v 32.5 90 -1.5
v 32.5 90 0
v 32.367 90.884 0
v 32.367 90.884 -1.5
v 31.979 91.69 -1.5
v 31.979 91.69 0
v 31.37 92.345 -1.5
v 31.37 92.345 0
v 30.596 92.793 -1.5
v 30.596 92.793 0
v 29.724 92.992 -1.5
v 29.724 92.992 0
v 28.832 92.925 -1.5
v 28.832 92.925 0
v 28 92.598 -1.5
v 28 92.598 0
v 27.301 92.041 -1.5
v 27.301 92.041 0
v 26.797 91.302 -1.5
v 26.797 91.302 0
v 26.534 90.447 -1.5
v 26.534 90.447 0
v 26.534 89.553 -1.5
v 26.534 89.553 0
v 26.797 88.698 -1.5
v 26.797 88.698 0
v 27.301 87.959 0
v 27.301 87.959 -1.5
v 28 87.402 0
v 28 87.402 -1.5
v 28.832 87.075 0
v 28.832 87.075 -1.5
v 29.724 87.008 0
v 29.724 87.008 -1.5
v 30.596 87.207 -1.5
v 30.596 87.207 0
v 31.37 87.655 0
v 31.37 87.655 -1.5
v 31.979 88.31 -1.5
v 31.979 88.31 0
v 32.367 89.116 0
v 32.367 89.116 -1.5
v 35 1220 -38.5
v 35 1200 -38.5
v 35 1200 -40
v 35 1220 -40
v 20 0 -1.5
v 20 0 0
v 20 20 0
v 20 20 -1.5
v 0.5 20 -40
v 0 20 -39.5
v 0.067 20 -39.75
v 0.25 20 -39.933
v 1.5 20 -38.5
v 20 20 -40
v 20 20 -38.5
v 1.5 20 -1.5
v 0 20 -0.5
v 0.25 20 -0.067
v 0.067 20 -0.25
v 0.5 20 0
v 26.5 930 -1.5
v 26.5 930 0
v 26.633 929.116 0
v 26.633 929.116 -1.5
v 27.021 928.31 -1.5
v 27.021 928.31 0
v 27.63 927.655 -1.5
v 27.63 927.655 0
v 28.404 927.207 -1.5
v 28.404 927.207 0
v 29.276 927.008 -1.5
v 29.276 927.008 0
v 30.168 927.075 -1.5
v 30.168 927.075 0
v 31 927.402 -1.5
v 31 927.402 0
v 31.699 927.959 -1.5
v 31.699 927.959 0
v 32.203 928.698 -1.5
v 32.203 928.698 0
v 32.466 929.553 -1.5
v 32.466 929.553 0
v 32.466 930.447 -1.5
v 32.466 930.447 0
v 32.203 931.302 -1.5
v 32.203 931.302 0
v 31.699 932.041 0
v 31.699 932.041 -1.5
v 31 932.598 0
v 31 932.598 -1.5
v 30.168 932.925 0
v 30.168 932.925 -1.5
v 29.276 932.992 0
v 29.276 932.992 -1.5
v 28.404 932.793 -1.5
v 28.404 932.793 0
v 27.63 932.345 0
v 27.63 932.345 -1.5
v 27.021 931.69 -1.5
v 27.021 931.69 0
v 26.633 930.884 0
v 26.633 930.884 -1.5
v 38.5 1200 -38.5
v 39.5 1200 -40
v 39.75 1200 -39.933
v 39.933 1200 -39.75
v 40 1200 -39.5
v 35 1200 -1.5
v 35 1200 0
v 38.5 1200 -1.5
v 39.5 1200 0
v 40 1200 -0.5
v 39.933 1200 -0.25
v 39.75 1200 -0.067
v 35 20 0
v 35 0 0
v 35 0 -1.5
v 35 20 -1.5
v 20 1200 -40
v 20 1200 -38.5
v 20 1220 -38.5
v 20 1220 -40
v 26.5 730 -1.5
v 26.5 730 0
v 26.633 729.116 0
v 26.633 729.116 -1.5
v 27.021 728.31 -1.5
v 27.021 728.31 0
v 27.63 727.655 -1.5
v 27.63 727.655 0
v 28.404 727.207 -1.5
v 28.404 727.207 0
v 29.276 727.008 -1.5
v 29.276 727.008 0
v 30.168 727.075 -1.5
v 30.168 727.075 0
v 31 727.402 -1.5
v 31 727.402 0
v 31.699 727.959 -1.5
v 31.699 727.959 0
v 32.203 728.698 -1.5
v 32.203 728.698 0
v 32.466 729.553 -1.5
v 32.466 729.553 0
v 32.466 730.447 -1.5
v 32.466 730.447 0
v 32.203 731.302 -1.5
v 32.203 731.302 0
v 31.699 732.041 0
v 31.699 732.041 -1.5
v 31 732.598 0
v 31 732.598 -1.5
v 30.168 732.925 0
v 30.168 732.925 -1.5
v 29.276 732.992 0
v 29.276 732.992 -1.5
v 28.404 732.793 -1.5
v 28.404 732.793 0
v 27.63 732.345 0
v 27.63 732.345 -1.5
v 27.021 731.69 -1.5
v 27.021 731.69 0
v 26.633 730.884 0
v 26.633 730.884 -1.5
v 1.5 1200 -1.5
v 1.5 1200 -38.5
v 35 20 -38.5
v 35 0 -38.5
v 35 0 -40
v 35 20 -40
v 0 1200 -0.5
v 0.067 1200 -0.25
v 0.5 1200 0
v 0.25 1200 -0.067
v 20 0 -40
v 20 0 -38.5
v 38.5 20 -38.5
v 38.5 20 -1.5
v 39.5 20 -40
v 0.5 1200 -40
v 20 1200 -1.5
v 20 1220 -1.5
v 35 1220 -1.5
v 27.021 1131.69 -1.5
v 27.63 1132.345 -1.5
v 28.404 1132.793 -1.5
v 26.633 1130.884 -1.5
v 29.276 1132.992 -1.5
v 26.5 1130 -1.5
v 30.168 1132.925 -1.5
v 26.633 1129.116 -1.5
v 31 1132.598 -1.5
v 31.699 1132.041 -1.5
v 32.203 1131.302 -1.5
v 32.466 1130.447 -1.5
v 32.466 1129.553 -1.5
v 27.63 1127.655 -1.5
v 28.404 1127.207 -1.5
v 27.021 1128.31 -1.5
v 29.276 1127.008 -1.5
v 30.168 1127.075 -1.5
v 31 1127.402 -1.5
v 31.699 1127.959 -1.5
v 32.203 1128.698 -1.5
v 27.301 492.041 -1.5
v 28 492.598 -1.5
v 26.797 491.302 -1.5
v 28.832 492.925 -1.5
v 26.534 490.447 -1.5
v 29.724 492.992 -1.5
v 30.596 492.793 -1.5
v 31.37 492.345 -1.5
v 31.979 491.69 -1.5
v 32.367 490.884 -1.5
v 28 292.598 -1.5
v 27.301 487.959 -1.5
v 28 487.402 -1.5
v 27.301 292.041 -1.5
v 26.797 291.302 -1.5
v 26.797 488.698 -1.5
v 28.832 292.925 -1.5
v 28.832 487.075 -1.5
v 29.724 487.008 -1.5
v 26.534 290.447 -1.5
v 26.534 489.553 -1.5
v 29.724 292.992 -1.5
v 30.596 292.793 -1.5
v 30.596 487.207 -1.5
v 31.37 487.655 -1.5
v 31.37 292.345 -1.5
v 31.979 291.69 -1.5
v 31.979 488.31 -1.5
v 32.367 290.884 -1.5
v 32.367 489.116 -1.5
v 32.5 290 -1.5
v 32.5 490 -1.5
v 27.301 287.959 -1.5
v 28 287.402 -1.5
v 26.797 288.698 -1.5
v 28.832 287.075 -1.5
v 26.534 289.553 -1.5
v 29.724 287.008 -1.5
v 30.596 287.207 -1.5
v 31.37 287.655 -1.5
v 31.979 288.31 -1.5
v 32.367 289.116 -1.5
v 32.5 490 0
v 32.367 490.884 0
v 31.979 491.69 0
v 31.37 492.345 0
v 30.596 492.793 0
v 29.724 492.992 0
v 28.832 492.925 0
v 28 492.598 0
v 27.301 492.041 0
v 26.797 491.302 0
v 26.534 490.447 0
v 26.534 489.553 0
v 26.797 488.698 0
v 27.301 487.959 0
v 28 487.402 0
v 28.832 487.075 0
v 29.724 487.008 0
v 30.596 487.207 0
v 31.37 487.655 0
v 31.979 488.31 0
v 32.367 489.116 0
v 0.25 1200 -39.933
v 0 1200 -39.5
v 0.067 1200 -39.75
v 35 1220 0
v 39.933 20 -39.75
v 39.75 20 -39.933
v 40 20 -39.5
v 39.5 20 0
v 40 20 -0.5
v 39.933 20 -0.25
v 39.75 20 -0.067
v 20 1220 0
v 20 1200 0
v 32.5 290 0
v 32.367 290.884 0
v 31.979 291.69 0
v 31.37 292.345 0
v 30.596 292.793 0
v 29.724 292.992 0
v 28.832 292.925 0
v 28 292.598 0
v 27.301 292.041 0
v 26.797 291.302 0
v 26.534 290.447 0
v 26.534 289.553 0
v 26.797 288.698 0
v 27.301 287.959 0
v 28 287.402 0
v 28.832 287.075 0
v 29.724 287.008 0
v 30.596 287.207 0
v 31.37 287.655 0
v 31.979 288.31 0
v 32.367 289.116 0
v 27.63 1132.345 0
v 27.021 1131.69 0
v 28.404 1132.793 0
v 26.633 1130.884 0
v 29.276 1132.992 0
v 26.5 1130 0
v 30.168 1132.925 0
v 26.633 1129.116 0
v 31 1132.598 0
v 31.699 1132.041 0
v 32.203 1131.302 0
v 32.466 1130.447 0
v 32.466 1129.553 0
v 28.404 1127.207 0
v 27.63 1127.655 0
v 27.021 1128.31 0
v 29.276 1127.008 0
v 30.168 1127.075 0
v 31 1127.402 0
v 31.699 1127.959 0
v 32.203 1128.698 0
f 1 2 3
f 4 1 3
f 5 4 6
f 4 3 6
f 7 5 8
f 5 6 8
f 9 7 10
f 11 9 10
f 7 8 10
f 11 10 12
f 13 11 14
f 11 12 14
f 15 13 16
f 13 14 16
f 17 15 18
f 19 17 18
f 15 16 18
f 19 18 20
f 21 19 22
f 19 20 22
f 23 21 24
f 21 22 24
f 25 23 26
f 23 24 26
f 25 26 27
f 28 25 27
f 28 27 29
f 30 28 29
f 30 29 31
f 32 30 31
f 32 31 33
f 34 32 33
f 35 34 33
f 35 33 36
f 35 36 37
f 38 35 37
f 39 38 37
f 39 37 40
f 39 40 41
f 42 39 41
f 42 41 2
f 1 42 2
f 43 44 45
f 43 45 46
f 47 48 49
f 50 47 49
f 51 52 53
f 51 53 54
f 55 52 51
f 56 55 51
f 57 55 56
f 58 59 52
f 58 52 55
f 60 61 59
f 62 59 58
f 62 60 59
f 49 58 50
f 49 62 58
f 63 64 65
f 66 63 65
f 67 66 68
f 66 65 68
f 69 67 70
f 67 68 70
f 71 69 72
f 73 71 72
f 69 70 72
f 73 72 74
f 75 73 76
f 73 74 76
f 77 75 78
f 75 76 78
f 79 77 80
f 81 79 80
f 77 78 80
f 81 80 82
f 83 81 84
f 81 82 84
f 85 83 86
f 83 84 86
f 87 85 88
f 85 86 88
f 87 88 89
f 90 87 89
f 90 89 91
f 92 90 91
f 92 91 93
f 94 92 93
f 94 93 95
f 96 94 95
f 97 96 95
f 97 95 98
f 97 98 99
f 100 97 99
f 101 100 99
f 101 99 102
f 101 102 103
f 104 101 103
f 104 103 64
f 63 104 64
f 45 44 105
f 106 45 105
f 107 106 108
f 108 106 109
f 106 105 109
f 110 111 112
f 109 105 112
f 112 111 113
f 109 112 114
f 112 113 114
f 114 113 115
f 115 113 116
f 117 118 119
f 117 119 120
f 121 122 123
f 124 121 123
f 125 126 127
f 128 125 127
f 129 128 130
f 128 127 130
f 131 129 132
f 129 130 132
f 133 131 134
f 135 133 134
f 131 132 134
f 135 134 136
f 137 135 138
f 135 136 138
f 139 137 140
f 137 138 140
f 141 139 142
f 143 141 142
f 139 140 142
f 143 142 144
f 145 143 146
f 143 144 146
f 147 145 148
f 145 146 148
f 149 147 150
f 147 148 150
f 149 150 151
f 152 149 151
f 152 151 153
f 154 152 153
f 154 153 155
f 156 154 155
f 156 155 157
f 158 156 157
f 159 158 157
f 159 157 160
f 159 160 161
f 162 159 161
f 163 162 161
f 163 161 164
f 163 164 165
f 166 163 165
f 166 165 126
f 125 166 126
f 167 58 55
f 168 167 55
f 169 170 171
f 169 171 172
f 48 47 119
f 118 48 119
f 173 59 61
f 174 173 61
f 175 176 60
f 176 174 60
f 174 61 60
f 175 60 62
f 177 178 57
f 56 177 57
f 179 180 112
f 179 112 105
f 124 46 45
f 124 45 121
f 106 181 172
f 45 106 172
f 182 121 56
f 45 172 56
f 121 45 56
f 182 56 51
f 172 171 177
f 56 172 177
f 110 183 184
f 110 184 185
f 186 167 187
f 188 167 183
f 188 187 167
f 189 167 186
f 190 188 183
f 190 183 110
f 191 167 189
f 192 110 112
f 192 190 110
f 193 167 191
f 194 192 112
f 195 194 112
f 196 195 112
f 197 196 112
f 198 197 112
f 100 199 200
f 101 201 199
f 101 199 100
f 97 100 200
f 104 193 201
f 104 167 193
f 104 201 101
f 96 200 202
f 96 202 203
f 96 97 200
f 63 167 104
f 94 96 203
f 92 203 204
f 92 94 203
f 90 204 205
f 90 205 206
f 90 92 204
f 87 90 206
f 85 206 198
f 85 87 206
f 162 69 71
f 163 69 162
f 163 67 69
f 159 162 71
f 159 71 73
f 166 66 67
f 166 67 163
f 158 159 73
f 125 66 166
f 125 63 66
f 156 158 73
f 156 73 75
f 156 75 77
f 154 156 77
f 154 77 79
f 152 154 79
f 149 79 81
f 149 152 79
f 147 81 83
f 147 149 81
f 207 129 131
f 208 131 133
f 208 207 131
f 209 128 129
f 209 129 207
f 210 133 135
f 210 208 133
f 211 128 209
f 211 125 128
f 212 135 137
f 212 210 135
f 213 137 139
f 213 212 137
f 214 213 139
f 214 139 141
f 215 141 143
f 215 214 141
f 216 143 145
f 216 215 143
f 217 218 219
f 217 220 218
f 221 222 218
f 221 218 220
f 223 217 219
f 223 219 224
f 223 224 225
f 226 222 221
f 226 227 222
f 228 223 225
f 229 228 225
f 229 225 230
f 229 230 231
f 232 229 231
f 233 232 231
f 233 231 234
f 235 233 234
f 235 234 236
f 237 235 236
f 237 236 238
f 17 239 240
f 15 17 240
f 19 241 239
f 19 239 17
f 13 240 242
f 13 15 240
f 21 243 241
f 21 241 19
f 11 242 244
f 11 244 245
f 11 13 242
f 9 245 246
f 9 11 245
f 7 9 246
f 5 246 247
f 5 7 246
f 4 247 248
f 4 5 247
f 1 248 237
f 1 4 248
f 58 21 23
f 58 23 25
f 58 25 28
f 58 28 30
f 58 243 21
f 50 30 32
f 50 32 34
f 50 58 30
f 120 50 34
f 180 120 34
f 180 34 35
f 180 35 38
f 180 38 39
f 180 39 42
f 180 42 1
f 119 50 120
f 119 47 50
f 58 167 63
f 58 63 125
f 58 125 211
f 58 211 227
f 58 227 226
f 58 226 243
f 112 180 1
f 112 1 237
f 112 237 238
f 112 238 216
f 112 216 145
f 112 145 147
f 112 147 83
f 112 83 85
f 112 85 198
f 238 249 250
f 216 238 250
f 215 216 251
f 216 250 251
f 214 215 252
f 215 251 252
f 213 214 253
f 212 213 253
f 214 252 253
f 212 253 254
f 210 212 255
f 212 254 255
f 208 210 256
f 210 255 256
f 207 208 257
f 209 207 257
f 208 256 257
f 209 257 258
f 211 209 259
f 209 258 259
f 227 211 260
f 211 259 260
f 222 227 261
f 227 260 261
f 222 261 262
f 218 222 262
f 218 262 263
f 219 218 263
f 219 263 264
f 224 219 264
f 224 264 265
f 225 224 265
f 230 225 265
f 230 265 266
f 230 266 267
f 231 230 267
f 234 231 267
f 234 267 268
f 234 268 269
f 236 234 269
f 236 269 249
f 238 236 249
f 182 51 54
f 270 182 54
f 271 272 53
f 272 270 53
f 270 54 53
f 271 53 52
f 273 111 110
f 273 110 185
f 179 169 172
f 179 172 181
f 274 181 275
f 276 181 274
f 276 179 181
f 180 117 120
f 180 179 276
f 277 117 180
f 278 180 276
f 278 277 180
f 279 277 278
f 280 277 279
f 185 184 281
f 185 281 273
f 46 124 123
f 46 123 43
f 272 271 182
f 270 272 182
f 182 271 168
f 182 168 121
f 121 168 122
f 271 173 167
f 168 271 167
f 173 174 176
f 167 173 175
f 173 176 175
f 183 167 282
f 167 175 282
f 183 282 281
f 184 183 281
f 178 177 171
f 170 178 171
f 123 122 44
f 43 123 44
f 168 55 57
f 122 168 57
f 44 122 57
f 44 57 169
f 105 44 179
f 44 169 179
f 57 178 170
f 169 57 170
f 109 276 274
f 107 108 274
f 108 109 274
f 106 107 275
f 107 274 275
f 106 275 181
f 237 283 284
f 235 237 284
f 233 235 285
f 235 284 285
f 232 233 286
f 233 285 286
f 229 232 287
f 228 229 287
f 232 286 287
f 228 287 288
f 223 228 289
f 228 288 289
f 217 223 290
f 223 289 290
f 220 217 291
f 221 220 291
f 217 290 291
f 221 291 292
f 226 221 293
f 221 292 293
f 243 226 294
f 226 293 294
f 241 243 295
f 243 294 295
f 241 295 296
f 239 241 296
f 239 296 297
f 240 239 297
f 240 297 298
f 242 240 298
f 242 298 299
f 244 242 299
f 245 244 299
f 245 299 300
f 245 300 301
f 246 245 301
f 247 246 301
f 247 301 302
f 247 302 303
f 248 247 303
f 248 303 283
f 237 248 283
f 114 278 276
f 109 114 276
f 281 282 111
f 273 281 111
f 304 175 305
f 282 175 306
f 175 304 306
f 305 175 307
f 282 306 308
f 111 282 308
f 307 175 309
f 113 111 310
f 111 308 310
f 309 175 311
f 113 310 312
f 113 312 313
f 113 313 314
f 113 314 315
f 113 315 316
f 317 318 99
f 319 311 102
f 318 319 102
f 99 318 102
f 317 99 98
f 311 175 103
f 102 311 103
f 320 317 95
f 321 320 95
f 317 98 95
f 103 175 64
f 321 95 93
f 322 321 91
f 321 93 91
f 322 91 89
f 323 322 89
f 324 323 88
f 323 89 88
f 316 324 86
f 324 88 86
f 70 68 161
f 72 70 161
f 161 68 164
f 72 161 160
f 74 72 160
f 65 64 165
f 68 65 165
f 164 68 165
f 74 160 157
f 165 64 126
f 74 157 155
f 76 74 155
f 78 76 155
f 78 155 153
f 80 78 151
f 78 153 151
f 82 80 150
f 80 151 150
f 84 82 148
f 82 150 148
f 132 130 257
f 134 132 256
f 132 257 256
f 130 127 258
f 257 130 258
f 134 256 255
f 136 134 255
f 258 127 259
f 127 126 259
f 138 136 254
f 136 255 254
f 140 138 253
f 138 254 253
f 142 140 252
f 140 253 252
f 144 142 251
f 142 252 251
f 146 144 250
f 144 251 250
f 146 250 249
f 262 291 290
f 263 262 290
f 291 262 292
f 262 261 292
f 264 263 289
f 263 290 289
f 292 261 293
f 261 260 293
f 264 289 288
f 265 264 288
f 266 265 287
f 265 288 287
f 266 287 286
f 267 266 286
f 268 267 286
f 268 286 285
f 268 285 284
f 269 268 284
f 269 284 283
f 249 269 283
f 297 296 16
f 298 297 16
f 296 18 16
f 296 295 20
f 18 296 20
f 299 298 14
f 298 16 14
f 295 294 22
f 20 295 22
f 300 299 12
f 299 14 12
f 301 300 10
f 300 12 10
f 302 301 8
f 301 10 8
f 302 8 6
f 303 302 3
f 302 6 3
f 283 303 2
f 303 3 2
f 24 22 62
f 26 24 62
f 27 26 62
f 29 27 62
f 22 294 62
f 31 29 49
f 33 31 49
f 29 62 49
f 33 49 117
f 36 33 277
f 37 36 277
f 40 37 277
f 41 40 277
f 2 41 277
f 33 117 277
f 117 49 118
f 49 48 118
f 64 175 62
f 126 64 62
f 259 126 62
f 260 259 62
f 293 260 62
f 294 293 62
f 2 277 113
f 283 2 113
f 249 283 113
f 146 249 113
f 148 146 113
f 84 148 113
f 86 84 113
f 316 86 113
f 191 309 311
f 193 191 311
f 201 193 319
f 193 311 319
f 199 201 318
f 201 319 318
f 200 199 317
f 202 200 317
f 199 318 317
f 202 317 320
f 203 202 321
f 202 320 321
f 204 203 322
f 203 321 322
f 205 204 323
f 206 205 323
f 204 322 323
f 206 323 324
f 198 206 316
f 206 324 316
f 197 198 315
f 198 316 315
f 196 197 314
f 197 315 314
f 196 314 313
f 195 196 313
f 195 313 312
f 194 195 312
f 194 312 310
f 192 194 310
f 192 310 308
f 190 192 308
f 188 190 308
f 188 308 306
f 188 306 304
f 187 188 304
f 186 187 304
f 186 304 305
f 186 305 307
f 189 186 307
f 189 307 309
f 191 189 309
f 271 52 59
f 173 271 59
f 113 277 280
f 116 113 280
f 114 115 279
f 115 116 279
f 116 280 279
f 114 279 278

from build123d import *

# Parameters (mm, degrees)
SKETCH1_W           = 37
SKETCH1_H           = 37
BOSS_EXTRUDE1_DEPTH = 1220
SKETCH2_W           = 20
SKETCH2_H           = 20
SKETCH2_W_2         = 5
CUT_EXTRUDE1_DEPTH  = 50
SKETCH3_R           = 3
CUT_EXTRUDE2_DEPTH  = 10


with BuildPart() as part:
    # Sketch1 → Boss-Extrude1 (new body)
    with BuildSketch(Plane(origin=(0, 0, 0), x_dir=(1, 0, 0), z_dir=(0, 1, 0))):
        with BuildLine():
            Line((0.5, 0), (39.5, 0))
            ThreePointArc((39.5, 0), (39.853553391, 0.146446609), (40, 0.5))
            Line((40, 0.5), (40, 39.5))
            ThreePointArc((40, 39.5), (39.853553391, 39.853553391), (39.5, 40))
            Line((39.5, 40), (0.5, 40))
            ThreePointArc((0.5, 40), (0.146446609, 39.853553391), (0, 39.5))
            Line((0, 39.5), (0, 0.5))
            ThreePointArc((0, 0.5), (0.146446609, 0.146446609), (0.5, 0))
        make_face()
        with Locations((20, 20)):
            Rectangle(SKETCH1_W, SKETCH1_H, mode=Mode.SUBTRACT)
    extrude(amount=BOSS_EXTRUDE1_DEPTH)

    # Sketch2 → Cut-Extrude1 (cut)
    with BuildSketch(Plane.XY):
        with Locations((10, 1210)):
            Rectangle(SKETCH2_W, SKETCH2_H)
        with Locations((37.5, 1210)):
            Rectangle(SKETCH2_W_2, SKETCH2_H)
        with Locations((10, 10)):
            Rectangle(SKETCH2_W, SKETCH2_H)
        with Locations((37.5, 10)):
            Rectangle(SKETCH2_W_2, SKETCH2_H)
    extrude(amount=-CUT_EXTRUDE1_DEPTH, mode=Mode.SUBTRACT)

    # Sketch3 → Cut-Extrude2 (cut)
    with BuildSketch(Plane.XY):
        with Locations((29.5, 90)):
            Circle(SKETCH3_R)
        with Locations((29.5, 290)):
            Circle(SKETCH3_R)
        with Locations((29.5, 490)):
            Circle(SKETCH3_R)
        with Locations(Location((29.5, 730, 0), (0, 0, 180))):
            Circle(SKETCH3_R)
        with Locations(Location((29.5, 930, 0), (0, 0, 180))):
            Circle(SKETCH3_R)
        with Locations(Location((29.5, 1130, 0), (0, 0, 180))):
            Circle(SKETCH3_R)
    extrude(amount=-CUT_EXTRUDE2_DEPTH, mode=Mode.SUBTRACT)


solid = part.part
